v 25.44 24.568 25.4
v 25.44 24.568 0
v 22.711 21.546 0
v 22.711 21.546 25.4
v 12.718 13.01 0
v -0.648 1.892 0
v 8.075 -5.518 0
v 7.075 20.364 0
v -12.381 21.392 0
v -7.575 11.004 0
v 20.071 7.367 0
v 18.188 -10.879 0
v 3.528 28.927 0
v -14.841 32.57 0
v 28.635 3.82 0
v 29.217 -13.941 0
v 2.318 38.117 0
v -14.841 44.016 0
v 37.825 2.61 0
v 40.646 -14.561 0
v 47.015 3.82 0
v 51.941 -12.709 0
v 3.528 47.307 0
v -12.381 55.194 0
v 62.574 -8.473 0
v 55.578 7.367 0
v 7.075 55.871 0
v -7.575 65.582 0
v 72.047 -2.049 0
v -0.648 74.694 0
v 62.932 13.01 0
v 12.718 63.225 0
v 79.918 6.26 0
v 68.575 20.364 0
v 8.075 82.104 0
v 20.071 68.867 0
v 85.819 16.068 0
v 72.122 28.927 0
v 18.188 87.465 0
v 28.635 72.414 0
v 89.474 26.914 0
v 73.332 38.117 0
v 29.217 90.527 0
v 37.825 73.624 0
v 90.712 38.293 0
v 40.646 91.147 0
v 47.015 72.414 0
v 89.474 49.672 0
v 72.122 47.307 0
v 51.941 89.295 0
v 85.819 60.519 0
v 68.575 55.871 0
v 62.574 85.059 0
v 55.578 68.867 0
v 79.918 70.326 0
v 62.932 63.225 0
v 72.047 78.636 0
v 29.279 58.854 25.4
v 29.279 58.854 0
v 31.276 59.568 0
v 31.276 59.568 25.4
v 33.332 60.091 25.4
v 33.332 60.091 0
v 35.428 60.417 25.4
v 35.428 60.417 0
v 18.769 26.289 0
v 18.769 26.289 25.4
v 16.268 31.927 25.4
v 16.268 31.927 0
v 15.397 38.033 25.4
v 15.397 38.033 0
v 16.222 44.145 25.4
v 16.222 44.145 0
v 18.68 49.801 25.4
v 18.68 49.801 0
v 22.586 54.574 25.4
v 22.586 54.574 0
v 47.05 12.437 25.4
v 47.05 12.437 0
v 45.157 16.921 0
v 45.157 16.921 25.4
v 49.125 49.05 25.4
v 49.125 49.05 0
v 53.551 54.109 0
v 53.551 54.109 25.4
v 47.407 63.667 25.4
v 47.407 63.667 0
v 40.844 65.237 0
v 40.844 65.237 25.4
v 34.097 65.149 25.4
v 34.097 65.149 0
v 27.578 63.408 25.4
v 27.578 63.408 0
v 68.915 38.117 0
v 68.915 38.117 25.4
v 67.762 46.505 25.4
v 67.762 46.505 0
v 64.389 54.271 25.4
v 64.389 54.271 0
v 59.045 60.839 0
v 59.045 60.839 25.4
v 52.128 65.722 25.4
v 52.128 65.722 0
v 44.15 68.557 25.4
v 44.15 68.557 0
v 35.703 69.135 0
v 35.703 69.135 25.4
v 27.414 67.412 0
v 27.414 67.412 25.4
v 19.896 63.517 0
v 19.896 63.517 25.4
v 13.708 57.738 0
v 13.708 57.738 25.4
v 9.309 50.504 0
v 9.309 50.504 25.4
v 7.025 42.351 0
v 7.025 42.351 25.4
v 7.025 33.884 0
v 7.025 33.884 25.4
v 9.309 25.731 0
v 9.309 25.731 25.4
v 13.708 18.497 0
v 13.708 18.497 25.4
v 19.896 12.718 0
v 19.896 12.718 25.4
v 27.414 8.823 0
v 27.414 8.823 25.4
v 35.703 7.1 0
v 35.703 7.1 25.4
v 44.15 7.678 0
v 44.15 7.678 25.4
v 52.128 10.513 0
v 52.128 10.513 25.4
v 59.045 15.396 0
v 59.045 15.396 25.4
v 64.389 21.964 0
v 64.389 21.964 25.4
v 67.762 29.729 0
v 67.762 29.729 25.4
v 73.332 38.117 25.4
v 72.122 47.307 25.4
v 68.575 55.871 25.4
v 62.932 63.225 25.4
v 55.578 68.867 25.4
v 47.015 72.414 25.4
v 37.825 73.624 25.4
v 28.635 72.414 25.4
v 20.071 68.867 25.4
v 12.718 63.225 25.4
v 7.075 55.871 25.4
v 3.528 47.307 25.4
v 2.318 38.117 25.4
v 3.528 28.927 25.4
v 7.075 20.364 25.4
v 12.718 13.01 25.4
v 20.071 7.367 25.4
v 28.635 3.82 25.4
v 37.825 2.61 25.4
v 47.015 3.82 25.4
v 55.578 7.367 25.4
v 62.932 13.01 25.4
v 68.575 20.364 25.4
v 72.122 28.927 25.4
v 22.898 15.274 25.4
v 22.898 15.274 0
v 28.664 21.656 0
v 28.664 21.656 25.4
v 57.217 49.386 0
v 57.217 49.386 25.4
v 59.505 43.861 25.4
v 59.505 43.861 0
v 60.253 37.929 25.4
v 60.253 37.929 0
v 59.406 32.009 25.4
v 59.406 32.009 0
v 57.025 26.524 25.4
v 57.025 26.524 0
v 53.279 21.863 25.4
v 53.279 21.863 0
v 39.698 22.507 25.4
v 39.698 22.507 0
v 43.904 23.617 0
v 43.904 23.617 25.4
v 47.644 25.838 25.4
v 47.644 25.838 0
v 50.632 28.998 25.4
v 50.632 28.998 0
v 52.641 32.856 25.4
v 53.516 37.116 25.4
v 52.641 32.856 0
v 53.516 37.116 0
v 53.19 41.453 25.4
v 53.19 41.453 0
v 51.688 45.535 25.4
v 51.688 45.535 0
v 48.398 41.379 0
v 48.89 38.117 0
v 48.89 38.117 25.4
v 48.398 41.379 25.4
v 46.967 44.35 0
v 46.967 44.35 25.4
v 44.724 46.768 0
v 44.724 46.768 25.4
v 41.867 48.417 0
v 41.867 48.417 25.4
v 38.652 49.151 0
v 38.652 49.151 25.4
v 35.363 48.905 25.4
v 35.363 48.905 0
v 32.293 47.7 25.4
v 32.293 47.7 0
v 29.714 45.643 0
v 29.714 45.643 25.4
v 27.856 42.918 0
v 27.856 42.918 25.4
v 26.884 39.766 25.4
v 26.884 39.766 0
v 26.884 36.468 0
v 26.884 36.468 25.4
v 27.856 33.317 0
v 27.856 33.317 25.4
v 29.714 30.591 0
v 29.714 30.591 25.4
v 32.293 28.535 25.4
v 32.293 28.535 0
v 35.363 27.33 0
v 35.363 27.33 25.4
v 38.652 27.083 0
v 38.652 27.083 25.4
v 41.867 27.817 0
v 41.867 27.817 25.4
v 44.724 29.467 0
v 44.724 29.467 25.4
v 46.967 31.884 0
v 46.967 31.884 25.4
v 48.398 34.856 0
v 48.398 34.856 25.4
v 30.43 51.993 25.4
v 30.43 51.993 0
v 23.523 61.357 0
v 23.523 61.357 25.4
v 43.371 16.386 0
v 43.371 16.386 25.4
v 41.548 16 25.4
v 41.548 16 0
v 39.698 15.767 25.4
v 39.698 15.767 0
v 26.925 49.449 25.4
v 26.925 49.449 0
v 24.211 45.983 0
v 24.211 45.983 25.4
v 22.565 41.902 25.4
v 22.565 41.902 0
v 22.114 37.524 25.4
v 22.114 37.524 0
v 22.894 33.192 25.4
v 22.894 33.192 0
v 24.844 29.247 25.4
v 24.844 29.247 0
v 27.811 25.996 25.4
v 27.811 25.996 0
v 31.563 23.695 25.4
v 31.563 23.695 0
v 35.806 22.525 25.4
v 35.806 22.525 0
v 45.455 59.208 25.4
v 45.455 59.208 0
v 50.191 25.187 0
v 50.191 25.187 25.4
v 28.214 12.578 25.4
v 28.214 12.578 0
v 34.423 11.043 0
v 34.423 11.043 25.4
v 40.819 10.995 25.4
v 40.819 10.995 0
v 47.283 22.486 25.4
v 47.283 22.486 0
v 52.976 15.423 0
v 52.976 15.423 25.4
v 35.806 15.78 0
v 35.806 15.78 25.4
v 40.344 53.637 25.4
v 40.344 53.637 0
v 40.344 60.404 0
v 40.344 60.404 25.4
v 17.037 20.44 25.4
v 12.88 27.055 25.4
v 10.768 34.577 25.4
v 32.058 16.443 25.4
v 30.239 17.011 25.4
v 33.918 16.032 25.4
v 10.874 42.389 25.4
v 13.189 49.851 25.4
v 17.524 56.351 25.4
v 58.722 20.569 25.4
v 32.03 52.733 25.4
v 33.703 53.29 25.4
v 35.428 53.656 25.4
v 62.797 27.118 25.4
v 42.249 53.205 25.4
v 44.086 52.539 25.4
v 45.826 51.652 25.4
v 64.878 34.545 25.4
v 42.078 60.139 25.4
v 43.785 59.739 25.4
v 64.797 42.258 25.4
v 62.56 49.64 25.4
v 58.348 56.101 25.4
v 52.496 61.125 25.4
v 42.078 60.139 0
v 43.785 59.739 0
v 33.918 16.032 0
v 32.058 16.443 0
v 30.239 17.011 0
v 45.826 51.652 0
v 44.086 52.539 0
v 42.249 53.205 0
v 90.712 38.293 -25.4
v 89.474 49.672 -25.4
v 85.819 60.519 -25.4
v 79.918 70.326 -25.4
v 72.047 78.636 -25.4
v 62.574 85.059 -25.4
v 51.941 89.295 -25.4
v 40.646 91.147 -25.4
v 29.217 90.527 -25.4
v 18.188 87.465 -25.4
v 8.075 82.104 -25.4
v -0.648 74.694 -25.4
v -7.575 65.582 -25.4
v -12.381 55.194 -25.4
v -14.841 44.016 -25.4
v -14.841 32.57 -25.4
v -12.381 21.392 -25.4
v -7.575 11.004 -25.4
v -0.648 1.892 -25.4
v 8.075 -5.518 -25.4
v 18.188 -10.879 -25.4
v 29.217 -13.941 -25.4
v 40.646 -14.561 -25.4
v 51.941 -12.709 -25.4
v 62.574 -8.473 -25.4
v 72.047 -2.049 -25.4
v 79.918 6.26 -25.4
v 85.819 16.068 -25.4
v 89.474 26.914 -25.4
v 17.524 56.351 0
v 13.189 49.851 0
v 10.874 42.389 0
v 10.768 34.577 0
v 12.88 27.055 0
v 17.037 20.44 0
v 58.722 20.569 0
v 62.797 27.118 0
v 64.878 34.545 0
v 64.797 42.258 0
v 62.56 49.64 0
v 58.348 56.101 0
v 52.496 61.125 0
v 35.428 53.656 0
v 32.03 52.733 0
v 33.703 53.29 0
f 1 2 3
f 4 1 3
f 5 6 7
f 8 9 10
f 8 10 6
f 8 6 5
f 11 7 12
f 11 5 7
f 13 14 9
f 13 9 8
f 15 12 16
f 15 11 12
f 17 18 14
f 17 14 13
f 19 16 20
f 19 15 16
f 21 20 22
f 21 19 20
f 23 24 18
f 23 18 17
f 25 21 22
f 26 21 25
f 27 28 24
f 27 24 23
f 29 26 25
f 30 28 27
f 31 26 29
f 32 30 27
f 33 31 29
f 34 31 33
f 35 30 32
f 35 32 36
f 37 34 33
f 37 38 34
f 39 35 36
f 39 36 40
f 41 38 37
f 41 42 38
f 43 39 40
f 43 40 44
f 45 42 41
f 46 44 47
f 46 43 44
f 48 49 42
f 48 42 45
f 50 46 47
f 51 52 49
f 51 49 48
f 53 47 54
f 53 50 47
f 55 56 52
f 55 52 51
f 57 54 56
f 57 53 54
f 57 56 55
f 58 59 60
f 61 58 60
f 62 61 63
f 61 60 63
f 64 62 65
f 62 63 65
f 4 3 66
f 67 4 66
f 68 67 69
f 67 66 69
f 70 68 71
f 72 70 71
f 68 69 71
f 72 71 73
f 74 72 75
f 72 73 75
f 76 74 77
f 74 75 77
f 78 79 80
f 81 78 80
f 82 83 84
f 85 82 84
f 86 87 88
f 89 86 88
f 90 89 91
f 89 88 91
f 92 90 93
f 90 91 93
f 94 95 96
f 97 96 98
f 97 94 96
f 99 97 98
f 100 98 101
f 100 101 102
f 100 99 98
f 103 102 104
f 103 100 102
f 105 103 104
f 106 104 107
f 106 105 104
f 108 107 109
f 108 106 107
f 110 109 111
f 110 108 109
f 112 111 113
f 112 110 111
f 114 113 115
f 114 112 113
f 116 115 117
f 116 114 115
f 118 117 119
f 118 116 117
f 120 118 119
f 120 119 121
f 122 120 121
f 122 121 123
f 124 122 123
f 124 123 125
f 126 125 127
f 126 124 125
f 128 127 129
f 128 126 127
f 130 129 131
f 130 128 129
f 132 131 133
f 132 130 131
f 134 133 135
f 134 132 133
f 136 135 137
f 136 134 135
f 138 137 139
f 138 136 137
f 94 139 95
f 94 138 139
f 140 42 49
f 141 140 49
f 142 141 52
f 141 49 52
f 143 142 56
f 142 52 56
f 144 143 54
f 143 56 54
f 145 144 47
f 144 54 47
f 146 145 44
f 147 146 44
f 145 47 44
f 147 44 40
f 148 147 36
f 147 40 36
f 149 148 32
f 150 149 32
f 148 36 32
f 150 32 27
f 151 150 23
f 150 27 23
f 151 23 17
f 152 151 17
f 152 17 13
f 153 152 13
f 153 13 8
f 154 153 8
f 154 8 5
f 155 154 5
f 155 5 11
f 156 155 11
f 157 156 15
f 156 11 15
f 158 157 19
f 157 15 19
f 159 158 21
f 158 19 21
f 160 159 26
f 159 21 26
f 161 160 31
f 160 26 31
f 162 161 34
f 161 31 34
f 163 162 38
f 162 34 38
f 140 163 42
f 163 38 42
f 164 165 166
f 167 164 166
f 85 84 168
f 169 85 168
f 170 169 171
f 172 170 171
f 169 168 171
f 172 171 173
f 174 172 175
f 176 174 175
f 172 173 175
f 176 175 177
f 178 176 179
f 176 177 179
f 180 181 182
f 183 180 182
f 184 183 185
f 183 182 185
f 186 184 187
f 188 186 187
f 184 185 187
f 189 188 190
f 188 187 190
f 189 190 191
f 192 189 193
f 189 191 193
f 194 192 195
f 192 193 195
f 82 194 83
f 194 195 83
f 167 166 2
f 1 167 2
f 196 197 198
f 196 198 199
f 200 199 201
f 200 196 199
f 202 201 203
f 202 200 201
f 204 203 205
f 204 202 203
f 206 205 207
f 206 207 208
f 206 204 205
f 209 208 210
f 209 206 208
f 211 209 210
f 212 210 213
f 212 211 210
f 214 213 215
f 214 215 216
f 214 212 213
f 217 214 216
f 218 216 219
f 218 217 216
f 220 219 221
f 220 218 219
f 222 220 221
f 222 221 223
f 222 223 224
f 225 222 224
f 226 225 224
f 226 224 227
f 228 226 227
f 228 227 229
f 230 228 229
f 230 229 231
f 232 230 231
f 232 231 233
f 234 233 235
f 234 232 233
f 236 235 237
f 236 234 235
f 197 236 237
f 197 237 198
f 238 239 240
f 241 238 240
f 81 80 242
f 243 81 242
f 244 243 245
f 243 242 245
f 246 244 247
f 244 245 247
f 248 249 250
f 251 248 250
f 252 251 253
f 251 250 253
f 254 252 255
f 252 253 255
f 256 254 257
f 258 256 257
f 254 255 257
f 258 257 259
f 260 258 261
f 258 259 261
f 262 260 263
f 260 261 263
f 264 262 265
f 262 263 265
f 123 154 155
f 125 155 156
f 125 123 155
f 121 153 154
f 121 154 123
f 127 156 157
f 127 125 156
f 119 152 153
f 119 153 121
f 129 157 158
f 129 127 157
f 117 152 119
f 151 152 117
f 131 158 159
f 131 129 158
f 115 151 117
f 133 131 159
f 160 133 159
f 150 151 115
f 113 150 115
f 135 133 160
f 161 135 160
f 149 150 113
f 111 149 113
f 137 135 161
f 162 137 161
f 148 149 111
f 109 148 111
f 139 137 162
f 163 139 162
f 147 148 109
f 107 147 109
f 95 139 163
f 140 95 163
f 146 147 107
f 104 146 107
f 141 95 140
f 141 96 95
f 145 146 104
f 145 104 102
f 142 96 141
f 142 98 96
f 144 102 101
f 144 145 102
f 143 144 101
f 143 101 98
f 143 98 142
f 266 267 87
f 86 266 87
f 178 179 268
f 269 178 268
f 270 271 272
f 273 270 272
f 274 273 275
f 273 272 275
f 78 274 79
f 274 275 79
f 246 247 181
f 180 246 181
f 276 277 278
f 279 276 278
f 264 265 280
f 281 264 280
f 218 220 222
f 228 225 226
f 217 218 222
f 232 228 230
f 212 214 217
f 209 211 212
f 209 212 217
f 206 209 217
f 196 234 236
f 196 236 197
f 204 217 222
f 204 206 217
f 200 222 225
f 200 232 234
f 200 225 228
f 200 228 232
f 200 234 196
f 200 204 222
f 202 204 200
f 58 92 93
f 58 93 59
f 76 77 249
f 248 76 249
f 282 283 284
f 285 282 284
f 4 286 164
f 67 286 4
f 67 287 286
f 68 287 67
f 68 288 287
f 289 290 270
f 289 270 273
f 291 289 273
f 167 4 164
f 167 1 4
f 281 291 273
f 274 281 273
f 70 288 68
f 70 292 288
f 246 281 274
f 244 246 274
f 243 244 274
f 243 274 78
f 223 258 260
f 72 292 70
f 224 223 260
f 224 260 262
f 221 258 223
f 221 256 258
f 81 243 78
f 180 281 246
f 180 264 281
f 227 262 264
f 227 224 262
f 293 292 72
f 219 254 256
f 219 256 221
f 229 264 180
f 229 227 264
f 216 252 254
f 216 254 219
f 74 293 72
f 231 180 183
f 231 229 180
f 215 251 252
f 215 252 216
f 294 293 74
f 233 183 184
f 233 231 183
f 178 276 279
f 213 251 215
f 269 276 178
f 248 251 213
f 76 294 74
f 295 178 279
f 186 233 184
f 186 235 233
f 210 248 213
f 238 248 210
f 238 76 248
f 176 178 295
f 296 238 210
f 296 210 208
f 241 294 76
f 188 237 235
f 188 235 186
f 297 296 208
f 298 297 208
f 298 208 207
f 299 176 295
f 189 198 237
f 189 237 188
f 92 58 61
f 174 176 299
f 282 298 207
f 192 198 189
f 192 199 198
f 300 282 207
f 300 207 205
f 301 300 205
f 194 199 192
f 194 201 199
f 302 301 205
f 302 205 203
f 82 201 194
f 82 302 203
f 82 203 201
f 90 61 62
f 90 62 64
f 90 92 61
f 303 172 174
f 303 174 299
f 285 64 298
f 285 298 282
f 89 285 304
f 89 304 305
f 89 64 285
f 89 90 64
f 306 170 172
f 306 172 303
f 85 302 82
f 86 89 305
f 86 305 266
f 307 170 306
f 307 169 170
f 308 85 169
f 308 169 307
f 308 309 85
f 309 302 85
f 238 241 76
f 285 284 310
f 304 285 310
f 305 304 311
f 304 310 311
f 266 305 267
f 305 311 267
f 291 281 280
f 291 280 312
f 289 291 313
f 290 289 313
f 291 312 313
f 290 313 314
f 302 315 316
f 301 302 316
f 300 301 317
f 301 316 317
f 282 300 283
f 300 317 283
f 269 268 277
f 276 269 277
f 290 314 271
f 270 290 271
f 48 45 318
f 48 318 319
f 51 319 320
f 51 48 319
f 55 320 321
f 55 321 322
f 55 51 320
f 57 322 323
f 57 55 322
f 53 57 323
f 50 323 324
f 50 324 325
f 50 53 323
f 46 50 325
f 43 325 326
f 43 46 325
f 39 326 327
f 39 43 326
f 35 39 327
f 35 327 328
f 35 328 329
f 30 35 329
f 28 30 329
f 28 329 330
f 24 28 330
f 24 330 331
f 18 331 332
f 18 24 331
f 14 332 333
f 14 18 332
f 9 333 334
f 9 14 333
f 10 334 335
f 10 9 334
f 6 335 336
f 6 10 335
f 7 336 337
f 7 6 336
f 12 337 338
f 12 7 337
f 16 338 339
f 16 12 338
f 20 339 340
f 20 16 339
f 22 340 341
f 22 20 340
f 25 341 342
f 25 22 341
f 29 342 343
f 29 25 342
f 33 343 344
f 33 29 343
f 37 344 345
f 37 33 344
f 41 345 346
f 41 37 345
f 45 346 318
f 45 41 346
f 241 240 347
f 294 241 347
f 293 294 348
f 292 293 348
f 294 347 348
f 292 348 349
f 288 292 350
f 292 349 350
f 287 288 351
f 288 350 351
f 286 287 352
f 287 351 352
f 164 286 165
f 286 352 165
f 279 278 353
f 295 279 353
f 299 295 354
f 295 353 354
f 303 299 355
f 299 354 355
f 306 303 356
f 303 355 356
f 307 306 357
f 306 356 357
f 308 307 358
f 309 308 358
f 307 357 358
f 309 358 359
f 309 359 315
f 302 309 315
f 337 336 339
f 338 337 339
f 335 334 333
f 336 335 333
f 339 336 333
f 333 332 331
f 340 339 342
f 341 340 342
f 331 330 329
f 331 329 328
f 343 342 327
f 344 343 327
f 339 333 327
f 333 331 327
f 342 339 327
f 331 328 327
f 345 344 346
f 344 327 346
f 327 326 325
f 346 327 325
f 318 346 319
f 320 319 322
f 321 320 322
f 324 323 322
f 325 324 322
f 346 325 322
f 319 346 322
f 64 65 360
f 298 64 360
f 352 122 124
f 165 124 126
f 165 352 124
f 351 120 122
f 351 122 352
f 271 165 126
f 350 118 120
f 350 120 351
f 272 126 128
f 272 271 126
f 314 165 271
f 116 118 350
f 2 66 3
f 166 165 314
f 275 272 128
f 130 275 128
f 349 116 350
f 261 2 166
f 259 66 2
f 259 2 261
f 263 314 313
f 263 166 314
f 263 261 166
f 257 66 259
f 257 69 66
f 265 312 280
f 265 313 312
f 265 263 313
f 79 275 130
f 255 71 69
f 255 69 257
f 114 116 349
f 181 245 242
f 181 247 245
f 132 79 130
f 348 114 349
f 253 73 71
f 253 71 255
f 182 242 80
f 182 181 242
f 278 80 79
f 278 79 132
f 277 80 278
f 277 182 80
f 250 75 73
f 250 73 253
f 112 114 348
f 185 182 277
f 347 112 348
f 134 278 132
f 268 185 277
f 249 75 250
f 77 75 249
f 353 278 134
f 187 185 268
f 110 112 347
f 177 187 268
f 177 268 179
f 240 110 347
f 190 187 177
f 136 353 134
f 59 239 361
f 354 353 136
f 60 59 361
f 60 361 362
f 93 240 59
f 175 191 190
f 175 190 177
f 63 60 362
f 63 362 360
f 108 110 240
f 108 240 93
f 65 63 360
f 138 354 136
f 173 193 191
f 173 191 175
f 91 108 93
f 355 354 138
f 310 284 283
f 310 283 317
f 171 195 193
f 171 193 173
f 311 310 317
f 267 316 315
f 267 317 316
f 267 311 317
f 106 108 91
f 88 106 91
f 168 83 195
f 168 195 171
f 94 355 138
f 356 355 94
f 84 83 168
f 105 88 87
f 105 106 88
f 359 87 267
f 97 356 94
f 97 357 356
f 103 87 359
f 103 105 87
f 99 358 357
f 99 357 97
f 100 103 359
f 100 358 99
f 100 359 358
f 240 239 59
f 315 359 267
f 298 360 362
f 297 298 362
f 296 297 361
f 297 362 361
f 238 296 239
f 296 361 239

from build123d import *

# Parameters (mm, degrees)
F1_R     = 52.9315512319
F2_DEPTH = 25.4
F0_R     = 35.506963498
F0_R_2   = 31.0898313576
F0_R_3   = 11.0647908741
F3_DEPTH = 25.4


with BuildPart() as f2:
    # F1 (on Top) → F2 (new body)
    with BuildSketch(Plane.XY):
        with Locations((37.7799719572, 38.2931493223)):
            Circle(F1_R)
    extrude(amount=-F2_DEPTH)

    # F0 (on Top) → F3 (join)
    with BuildSketch(Plane.XY):
        with Locations((37.8249250984, 38.1173377679)):
            Circle(F0_R)
        with Locations((37.8249250984, 38.1173377679)):
            Circle(F0_R_2, mode=Mode.SUBTRACT)
        with BuildLine():
            Line((39.6984675691, 15.7673542773), (39.6984675691, 22.5067331888))
            ThreePointArc((39.6984675691, 22.5067331888), (52.6409755568, 32.8556093898), (49.1248120408, 49.0495695529))
            Line((49.1248120408, 49.0495695529), (53.550650699, 54.1090067787))
            ThreePointArc((53.550650699, 54.1090067787), (60.2525032987, 37.9285005747), (53.2791448176, 21.8631378094))
            Line((53.2791448176, 21.8631378094), (50.191392118, 25.1873300248))
            Line((50.191392118, 25.1873300248), (47.2831900335, 22.4859793641))
            Line((47.2831900335, 22.4859793641), (52.9763745223, 15.4227610277))
            ThreePointArc((52.9763745223, 15.4227610277), (65.1109642741, 38.4042160738), (52.4958682608, 61.1254593728))
            Line((52.4958682608, 61.1254593728), (45.8262898028, 51.651712507))
            ThreePointArc((45.8262898028, 51.651712507), (43.1781915167, 52.9005605345), (40.3444612137, 53.6367795902))
            Line((40.3444612137, 53.6367795902), (40.3444612137, 60.4037430676))
            ThreePointArc((40.3444612137, 60.4037430676), (42.9350031847, 59.9558135703), (45.4553338012, 59.2078281948))
            Line((45.4553338012, 59.2078281948), (47.4071712256, 63.6671086518))
            ThreePointArc((47.4071712256, 63.6671086518), (37.4680887103, 65.4025517281), (27.5777899968, 63.4077797425))
            Line((27.5777899968, 63.4077797425), (29.278934359, 58.8537300699))
            ThreePointArc((29.278934359, 58.8537300699), (32.2977523612, 59.8539953986), (35.4276978636, 60.4172307049))
            Line((35.4276978636, 60.4172307049), (35.4276978636, 53.6561420429))
            ThreePointArc((35.4276978636, 53.6561420429), (32.8588323546, 53.0350808805), (30.4302861837, 51.992511714))
            Line((30.4302861837, 51.992511714), (23.5229166343, 61.3565887661))
            ThreePointArc((23.5229166343, 61.3565887661), (10.5398831677, 38.487094317), (22.8984252987, 15.2741804381))
            Line((22.8984252987, 15.2741804381), (28.6635132157, 21.6562780329))
            Line((28.6635132157, 21.6562780329), (25.4403483123, 24.5678331703))
            Line((25.4403483123, 24.5678331703), (22.7109340757, 21.5463028337))
            ThreePointArc((22.7109340757, 21.5463028337), (15.3967115962, 38.0327060784), (22.5863063982, 54.5738387183))
            Line((22.5863063982, 54.5738387183), (26.9251461211, 49.4485316573))
            ThreePointArc((26.9251461211, 49.4485316573), (22.8935948893, 33.1922474233), (35.8058956554, 22.524882643))
            Line((35.8058956554, 22.524882643), (35.8058956554, 15.7800271973))
            ThreePointArc((35.8058956554, 15.7800271973), (32.9834142581, 16.2177556668), (30.2394509025, 17.0106444067))
            Line((30.2394509025, 17.0106444067), (28.214135887, 12.5782899431))
            ThreePointArc((28.214135887, 12.5782899431), (37.6196577159, 10.8305626128), (47.0504085033, 12.4365922762))
            Line((47.0504085033, 12.4365922762), (45.1568101775, 16.921220562))
            ThreePointArc((45.1568101775, 16.921220562), (42.4636561689, 16.1739082849), (39.6984675691, 15.7673542773))
        make_face()
        with Locations((37.8249250984, 38.1173377679)):
            Circle(F0_R_3, mode=Mode.SUBTRACT)
    extrude(amount=F3_DEPTH)


solid = f2.part
